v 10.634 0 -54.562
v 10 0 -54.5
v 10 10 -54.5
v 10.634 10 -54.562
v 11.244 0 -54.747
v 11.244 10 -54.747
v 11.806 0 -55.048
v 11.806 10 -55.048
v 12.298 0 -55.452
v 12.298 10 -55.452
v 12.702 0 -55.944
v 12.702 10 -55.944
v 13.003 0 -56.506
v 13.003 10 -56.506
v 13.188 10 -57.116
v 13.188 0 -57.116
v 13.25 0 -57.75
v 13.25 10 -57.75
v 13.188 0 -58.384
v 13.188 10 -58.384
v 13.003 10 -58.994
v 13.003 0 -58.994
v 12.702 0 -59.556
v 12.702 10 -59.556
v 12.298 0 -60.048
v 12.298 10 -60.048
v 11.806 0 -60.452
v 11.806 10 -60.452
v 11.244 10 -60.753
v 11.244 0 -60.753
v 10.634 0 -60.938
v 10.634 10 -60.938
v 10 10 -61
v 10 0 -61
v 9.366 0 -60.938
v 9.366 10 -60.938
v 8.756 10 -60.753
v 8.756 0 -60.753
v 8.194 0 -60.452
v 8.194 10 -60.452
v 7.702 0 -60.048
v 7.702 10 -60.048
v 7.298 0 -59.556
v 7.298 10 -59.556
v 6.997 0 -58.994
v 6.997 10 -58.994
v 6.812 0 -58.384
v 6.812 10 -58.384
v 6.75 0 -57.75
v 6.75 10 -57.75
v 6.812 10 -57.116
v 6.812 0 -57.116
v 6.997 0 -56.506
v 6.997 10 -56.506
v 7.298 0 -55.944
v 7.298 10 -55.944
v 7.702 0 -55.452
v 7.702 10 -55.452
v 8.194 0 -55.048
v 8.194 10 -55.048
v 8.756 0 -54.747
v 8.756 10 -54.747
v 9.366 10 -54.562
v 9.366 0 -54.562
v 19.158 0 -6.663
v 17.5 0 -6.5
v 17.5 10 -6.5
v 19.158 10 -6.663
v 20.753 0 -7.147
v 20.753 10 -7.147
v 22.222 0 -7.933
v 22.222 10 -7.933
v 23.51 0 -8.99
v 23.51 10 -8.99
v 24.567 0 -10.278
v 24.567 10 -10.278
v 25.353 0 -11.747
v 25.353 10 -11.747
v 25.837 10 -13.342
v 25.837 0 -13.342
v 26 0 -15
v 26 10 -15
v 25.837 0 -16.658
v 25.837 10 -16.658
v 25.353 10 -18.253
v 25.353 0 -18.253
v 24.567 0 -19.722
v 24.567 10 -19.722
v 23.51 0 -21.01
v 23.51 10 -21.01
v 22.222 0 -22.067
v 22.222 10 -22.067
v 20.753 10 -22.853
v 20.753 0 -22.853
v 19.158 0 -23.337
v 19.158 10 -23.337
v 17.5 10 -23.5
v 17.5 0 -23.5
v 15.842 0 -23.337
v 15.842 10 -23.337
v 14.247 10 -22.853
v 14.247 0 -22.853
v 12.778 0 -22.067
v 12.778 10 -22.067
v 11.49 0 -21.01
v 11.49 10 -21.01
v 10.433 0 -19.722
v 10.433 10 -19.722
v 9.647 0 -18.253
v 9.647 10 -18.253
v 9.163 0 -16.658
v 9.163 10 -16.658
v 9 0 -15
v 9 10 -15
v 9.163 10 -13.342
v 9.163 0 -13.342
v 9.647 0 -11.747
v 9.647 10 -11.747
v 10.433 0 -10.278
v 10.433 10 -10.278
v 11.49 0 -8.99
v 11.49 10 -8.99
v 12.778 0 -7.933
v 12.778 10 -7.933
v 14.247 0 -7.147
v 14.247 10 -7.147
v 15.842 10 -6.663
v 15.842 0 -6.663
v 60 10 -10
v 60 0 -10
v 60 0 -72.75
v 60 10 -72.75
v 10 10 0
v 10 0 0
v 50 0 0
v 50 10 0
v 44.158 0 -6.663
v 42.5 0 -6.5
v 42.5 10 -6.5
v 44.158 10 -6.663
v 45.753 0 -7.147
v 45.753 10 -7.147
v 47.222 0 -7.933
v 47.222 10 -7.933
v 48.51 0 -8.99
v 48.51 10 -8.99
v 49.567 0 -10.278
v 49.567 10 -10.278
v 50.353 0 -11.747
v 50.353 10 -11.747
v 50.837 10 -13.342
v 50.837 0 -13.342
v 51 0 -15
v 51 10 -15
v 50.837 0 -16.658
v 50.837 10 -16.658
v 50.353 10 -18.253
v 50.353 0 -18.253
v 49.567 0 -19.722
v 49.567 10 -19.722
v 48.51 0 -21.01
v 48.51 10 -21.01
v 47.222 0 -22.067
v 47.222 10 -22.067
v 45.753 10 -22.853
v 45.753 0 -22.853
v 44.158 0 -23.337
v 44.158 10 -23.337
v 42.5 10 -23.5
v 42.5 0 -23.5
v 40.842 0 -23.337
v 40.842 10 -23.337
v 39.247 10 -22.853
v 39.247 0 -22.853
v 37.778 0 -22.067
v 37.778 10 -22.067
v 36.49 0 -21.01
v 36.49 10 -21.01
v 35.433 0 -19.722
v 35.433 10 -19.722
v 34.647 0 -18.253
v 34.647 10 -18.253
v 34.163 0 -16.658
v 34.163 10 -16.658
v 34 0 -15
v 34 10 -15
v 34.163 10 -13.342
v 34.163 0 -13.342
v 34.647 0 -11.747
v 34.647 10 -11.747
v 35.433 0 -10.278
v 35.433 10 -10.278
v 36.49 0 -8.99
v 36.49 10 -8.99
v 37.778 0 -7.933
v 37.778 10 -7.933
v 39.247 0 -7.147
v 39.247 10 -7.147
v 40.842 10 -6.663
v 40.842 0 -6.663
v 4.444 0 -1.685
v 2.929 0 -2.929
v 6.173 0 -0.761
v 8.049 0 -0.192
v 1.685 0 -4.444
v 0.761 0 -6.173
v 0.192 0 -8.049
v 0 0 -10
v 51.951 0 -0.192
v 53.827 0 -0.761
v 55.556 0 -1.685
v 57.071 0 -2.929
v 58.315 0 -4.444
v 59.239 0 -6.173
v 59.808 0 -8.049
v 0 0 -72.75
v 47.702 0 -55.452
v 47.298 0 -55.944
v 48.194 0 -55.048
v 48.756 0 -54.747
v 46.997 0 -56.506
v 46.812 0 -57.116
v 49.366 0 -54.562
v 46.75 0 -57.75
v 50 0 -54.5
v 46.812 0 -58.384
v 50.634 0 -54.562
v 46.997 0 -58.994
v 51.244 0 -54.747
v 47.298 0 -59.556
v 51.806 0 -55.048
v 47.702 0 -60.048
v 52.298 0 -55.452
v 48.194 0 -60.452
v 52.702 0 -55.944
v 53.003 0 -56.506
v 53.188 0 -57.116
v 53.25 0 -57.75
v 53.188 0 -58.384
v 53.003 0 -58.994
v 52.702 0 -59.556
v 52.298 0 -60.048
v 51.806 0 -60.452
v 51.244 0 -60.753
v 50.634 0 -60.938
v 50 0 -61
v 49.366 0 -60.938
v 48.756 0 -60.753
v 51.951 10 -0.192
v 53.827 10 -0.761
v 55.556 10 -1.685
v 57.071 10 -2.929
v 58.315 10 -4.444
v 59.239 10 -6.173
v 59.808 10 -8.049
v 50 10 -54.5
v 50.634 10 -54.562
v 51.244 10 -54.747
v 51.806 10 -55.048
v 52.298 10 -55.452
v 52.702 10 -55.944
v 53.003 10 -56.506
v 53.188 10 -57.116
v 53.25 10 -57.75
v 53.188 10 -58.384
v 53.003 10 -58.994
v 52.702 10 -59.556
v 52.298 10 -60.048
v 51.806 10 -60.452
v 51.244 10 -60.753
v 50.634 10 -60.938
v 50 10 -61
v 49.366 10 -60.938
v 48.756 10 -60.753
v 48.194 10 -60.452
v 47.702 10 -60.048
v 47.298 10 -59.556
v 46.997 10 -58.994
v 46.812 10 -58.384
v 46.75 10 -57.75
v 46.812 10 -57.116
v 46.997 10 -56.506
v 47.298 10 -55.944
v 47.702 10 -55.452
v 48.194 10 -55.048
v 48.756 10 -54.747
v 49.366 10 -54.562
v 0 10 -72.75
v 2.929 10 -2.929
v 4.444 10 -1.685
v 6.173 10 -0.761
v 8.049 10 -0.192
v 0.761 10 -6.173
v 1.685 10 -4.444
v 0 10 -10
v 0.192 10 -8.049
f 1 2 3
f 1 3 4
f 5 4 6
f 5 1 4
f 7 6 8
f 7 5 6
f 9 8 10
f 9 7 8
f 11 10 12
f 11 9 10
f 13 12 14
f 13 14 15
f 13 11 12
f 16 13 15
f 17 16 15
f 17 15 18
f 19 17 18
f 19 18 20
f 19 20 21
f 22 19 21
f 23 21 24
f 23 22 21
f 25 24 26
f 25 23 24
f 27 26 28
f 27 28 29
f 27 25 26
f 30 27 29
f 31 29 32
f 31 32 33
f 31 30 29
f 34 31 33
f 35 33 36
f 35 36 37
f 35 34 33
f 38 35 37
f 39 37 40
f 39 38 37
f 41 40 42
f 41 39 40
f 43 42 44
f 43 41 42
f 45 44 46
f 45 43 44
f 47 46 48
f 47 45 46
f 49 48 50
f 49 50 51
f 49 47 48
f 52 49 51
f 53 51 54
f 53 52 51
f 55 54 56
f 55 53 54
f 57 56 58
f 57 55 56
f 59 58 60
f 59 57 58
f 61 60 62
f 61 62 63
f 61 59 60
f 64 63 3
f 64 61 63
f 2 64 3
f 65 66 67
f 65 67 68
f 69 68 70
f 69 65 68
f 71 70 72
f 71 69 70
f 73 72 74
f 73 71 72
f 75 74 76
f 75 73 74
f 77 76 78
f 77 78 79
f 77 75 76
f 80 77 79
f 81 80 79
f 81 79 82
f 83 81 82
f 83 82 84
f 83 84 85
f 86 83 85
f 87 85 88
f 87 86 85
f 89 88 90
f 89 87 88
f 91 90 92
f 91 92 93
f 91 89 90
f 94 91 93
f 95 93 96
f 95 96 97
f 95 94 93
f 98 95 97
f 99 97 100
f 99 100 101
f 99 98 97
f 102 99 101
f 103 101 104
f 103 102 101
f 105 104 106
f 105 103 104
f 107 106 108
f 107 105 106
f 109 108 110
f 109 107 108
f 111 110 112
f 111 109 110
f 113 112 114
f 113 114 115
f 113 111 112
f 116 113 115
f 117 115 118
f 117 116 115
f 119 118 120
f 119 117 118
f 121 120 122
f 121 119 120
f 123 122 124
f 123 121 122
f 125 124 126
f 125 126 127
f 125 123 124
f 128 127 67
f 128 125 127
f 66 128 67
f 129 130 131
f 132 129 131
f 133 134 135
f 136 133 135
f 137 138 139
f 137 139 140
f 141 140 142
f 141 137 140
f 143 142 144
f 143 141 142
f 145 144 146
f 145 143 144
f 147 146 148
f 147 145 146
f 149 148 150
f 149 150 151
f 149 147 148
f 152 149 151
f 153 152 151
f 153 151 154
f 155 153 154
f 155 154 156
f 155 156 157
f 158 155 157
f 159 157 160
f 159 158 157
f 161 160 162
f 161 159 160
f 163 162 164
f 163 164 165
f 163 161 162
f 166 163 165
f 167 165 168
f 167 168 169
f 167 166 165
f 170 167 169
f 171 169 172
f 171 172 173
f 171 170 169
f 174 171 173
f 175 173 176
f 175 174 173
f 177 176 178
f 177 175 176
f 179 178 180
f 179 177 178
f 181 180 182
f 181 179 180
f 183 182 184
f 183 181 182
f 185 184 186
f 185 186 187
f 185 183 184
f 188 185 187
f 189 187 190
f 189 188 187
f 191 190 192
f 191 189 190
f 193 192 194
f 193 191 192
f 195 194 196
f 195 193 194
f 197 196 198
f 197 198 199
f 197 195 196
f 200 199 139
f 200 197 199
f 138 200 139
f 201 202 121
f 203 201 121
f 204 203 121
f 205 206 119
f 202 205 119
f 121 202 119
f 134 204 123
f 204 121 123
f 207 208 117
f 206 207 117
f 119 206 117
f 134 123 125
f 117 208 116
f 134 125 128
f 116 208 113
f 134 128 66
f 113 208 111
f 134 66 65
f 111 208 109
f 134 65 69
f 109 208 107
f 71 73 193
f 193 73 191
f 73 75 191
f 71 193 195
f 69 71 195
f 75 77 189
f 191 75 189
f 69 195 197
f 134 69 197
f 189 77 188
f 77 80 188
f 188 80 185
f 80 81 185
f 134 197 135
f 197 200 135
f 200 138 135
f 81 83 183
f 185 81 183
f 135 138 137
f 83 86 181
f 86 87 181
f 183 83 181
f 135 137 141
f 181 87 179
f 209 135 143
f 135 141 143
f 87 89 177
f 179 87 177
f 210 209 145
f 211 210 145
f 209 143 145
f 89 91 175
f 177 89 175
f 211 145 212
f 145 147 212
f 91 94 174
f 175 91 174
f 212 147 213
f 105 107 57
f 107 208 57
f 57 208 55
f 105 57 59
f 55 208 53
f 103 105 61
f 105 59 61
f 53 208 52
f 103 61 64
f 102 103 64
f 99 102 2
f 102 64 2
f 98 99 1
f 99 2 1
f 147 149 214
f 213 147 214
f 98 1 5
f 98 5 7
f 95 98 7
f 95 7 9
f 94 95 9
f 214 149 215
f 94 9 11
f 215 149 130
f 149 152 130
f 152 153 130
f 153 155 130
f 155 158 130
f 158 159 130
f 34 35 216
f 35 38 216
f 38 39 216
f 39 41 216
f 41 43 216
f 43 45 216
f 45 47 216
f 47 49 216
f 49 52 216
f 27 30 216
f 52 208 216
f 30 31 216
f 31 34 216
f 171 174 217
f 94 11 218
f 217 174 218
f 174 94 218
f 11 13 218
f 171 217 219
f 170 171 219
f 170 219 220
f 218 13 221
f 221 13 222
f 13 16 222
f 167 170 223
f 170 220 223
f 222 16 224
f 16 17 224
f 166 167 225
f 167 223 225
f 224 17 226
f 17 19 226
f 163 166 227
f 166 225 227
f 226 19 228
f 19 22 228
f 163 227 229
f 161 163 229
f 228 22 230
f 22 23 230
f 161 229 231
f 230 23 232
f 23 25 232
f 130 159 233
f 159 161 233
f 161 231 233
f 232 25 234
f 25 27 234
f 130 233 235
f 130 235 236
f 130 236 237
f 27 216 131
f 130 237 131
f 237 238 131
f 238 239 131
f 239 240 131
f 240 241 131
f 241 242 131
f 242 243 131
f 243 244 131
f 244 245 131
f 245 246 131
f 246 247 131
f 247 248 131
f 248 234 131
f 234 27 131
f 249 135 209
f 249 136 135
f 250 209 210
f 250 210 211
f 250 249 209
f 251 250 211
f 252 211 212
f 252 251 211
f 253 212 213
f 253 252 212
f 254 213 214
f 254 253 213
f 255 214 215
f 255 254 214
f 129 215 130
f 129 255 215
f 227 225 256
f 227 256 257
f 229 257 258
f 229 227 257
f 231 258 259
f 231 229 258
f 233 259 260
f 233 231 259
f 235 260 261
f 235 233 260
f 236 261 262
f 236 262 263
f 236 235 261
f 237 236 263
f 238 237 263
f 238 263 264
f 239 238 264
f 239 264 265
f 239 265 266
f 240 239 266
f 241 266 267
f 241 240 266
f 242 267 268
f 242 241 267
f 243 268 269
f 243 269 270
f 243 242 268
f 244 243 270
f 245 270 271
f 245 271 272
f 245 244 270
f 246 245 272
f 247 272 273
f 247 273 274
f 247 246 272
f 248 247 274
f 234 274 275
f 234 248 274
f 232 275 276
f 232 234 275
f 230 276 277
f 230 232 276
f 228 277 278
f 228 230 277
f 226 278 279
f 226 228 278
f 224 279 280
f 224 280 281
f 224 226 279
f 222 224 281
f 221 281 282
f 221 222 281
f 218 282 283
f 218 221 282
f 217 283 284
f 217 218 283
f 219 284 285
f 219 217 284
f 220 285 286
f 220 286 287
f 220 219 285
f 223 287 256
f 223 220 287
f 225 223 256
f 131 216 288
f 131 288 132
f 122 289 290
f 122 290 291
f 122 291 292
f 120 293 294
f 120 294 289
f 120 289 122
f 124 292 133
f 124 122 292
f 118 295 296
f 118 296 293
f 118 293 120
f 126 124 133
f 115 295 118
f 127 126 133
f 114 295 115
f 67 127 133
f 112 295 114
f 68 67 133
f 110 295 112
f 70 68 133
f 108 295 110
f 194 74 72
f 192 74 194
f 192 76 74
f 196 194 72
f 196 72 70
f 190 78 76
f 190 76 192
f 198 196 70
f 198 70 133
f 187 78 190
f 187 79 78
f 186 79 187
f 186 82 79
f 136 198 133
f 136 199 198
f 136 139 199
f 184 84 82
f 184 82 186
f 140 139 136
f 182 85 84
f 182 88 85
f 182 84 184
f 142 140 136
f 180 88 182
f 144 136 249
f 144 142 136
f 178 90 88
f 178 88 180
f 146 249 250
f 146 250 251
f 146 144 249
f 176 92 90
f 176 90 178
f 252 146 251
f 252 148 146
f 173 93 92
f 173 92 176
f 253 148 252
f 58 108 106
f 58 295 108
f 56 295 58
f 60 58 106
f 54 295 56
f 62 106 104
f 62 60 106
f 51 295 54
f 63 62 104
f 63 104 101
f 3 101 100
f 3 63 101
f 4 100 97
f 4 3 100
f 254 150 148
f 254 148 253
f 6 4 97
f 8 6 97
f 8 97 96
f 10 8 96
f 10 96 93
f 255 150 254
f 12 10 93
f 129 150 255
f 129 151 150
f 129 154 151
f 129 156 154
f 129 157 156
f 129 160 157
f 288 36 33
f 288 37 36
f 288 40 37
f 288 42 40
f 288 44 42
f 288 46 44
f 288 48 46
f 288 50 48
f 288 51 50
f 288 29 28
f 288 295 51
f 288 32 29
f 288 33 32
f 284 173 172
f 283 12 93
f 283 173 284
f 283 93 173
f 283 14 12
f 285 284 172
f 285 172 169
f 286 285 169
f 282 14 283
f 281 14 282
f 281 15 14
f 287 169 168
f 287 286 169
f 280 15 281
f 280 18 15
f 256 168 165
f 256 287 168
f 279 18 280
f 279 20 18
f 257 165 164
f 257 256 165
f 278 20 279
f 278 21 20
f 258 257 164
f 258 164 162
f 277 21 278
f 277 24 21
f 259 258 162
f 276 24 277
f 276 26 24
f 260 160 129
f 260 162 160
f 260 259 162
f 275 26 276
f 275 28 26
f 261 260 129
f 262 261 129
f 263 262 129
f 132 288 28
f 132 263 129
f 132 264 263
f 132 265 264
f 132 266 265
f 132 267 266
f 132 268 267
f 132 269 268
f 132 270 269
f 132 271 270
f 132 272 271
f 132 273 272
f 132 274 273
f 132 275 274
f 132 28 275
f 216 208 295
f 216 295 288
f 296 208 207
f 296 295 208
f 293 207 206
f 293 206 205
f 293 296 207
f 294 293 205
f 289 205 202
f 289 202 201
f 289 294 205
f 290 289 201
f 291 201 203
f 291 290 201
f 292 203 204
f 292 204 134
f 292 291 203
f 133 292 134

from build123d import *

# Parameters (mm, degrees)
SKETCH10_W          = 60
SKETCH10_H          = 72.75
SKETCH10_R          = 3.25
SKETCH10_R_2        = 8.5
BOSS_EXTRUDE1_DEPTH = 10
FILLET1_R           = 10


with BuildPart() as part:
    # Sketch10 → Boss-Extrude1 (new body)
    with BuildSketch(Plane(origin=(0, 0, 0), x_dir=(1, 0, 0), z_dir=(0, 1, 0))):
        with Locations((30, 36.375)):
            Rectangle(SKETCH10_W, SKETCH10_H)
        with Locations(Location((10, 57.75, 0), (0, 0, 270))):
            Circle(SKETCH10_R, mode=Mode.SUBTRACT)
        with Locations(Location((17.5, 15, 0), (0, 0, 270))):
            Circle(SKETCH10_R_2, mode=Mode.SUBTRACT)
        with Locations(Location((50, 57.75, 0), (0, 0, 270))):
            Circle(SKETCH10_R, mode=Mode.SUBTRACT)
        with Locations(Location((42.5, 15, 0), (0, 0, 270))):
            Circle(SKETCH10_R_2, mode=Mode.SUBTRACT)
    extrude(amount=BOSS_EXTRUDE1_DEPTH)

    # Fillet1
    fillet1_edges = [part.edges().sort_by_distance(p)[0] for p in [
        (60, 5, 0),
        (0, 5, 0),
    ]]
    fillet(fillet1_edges, radius=FILLET1_R)


solid = part.part
